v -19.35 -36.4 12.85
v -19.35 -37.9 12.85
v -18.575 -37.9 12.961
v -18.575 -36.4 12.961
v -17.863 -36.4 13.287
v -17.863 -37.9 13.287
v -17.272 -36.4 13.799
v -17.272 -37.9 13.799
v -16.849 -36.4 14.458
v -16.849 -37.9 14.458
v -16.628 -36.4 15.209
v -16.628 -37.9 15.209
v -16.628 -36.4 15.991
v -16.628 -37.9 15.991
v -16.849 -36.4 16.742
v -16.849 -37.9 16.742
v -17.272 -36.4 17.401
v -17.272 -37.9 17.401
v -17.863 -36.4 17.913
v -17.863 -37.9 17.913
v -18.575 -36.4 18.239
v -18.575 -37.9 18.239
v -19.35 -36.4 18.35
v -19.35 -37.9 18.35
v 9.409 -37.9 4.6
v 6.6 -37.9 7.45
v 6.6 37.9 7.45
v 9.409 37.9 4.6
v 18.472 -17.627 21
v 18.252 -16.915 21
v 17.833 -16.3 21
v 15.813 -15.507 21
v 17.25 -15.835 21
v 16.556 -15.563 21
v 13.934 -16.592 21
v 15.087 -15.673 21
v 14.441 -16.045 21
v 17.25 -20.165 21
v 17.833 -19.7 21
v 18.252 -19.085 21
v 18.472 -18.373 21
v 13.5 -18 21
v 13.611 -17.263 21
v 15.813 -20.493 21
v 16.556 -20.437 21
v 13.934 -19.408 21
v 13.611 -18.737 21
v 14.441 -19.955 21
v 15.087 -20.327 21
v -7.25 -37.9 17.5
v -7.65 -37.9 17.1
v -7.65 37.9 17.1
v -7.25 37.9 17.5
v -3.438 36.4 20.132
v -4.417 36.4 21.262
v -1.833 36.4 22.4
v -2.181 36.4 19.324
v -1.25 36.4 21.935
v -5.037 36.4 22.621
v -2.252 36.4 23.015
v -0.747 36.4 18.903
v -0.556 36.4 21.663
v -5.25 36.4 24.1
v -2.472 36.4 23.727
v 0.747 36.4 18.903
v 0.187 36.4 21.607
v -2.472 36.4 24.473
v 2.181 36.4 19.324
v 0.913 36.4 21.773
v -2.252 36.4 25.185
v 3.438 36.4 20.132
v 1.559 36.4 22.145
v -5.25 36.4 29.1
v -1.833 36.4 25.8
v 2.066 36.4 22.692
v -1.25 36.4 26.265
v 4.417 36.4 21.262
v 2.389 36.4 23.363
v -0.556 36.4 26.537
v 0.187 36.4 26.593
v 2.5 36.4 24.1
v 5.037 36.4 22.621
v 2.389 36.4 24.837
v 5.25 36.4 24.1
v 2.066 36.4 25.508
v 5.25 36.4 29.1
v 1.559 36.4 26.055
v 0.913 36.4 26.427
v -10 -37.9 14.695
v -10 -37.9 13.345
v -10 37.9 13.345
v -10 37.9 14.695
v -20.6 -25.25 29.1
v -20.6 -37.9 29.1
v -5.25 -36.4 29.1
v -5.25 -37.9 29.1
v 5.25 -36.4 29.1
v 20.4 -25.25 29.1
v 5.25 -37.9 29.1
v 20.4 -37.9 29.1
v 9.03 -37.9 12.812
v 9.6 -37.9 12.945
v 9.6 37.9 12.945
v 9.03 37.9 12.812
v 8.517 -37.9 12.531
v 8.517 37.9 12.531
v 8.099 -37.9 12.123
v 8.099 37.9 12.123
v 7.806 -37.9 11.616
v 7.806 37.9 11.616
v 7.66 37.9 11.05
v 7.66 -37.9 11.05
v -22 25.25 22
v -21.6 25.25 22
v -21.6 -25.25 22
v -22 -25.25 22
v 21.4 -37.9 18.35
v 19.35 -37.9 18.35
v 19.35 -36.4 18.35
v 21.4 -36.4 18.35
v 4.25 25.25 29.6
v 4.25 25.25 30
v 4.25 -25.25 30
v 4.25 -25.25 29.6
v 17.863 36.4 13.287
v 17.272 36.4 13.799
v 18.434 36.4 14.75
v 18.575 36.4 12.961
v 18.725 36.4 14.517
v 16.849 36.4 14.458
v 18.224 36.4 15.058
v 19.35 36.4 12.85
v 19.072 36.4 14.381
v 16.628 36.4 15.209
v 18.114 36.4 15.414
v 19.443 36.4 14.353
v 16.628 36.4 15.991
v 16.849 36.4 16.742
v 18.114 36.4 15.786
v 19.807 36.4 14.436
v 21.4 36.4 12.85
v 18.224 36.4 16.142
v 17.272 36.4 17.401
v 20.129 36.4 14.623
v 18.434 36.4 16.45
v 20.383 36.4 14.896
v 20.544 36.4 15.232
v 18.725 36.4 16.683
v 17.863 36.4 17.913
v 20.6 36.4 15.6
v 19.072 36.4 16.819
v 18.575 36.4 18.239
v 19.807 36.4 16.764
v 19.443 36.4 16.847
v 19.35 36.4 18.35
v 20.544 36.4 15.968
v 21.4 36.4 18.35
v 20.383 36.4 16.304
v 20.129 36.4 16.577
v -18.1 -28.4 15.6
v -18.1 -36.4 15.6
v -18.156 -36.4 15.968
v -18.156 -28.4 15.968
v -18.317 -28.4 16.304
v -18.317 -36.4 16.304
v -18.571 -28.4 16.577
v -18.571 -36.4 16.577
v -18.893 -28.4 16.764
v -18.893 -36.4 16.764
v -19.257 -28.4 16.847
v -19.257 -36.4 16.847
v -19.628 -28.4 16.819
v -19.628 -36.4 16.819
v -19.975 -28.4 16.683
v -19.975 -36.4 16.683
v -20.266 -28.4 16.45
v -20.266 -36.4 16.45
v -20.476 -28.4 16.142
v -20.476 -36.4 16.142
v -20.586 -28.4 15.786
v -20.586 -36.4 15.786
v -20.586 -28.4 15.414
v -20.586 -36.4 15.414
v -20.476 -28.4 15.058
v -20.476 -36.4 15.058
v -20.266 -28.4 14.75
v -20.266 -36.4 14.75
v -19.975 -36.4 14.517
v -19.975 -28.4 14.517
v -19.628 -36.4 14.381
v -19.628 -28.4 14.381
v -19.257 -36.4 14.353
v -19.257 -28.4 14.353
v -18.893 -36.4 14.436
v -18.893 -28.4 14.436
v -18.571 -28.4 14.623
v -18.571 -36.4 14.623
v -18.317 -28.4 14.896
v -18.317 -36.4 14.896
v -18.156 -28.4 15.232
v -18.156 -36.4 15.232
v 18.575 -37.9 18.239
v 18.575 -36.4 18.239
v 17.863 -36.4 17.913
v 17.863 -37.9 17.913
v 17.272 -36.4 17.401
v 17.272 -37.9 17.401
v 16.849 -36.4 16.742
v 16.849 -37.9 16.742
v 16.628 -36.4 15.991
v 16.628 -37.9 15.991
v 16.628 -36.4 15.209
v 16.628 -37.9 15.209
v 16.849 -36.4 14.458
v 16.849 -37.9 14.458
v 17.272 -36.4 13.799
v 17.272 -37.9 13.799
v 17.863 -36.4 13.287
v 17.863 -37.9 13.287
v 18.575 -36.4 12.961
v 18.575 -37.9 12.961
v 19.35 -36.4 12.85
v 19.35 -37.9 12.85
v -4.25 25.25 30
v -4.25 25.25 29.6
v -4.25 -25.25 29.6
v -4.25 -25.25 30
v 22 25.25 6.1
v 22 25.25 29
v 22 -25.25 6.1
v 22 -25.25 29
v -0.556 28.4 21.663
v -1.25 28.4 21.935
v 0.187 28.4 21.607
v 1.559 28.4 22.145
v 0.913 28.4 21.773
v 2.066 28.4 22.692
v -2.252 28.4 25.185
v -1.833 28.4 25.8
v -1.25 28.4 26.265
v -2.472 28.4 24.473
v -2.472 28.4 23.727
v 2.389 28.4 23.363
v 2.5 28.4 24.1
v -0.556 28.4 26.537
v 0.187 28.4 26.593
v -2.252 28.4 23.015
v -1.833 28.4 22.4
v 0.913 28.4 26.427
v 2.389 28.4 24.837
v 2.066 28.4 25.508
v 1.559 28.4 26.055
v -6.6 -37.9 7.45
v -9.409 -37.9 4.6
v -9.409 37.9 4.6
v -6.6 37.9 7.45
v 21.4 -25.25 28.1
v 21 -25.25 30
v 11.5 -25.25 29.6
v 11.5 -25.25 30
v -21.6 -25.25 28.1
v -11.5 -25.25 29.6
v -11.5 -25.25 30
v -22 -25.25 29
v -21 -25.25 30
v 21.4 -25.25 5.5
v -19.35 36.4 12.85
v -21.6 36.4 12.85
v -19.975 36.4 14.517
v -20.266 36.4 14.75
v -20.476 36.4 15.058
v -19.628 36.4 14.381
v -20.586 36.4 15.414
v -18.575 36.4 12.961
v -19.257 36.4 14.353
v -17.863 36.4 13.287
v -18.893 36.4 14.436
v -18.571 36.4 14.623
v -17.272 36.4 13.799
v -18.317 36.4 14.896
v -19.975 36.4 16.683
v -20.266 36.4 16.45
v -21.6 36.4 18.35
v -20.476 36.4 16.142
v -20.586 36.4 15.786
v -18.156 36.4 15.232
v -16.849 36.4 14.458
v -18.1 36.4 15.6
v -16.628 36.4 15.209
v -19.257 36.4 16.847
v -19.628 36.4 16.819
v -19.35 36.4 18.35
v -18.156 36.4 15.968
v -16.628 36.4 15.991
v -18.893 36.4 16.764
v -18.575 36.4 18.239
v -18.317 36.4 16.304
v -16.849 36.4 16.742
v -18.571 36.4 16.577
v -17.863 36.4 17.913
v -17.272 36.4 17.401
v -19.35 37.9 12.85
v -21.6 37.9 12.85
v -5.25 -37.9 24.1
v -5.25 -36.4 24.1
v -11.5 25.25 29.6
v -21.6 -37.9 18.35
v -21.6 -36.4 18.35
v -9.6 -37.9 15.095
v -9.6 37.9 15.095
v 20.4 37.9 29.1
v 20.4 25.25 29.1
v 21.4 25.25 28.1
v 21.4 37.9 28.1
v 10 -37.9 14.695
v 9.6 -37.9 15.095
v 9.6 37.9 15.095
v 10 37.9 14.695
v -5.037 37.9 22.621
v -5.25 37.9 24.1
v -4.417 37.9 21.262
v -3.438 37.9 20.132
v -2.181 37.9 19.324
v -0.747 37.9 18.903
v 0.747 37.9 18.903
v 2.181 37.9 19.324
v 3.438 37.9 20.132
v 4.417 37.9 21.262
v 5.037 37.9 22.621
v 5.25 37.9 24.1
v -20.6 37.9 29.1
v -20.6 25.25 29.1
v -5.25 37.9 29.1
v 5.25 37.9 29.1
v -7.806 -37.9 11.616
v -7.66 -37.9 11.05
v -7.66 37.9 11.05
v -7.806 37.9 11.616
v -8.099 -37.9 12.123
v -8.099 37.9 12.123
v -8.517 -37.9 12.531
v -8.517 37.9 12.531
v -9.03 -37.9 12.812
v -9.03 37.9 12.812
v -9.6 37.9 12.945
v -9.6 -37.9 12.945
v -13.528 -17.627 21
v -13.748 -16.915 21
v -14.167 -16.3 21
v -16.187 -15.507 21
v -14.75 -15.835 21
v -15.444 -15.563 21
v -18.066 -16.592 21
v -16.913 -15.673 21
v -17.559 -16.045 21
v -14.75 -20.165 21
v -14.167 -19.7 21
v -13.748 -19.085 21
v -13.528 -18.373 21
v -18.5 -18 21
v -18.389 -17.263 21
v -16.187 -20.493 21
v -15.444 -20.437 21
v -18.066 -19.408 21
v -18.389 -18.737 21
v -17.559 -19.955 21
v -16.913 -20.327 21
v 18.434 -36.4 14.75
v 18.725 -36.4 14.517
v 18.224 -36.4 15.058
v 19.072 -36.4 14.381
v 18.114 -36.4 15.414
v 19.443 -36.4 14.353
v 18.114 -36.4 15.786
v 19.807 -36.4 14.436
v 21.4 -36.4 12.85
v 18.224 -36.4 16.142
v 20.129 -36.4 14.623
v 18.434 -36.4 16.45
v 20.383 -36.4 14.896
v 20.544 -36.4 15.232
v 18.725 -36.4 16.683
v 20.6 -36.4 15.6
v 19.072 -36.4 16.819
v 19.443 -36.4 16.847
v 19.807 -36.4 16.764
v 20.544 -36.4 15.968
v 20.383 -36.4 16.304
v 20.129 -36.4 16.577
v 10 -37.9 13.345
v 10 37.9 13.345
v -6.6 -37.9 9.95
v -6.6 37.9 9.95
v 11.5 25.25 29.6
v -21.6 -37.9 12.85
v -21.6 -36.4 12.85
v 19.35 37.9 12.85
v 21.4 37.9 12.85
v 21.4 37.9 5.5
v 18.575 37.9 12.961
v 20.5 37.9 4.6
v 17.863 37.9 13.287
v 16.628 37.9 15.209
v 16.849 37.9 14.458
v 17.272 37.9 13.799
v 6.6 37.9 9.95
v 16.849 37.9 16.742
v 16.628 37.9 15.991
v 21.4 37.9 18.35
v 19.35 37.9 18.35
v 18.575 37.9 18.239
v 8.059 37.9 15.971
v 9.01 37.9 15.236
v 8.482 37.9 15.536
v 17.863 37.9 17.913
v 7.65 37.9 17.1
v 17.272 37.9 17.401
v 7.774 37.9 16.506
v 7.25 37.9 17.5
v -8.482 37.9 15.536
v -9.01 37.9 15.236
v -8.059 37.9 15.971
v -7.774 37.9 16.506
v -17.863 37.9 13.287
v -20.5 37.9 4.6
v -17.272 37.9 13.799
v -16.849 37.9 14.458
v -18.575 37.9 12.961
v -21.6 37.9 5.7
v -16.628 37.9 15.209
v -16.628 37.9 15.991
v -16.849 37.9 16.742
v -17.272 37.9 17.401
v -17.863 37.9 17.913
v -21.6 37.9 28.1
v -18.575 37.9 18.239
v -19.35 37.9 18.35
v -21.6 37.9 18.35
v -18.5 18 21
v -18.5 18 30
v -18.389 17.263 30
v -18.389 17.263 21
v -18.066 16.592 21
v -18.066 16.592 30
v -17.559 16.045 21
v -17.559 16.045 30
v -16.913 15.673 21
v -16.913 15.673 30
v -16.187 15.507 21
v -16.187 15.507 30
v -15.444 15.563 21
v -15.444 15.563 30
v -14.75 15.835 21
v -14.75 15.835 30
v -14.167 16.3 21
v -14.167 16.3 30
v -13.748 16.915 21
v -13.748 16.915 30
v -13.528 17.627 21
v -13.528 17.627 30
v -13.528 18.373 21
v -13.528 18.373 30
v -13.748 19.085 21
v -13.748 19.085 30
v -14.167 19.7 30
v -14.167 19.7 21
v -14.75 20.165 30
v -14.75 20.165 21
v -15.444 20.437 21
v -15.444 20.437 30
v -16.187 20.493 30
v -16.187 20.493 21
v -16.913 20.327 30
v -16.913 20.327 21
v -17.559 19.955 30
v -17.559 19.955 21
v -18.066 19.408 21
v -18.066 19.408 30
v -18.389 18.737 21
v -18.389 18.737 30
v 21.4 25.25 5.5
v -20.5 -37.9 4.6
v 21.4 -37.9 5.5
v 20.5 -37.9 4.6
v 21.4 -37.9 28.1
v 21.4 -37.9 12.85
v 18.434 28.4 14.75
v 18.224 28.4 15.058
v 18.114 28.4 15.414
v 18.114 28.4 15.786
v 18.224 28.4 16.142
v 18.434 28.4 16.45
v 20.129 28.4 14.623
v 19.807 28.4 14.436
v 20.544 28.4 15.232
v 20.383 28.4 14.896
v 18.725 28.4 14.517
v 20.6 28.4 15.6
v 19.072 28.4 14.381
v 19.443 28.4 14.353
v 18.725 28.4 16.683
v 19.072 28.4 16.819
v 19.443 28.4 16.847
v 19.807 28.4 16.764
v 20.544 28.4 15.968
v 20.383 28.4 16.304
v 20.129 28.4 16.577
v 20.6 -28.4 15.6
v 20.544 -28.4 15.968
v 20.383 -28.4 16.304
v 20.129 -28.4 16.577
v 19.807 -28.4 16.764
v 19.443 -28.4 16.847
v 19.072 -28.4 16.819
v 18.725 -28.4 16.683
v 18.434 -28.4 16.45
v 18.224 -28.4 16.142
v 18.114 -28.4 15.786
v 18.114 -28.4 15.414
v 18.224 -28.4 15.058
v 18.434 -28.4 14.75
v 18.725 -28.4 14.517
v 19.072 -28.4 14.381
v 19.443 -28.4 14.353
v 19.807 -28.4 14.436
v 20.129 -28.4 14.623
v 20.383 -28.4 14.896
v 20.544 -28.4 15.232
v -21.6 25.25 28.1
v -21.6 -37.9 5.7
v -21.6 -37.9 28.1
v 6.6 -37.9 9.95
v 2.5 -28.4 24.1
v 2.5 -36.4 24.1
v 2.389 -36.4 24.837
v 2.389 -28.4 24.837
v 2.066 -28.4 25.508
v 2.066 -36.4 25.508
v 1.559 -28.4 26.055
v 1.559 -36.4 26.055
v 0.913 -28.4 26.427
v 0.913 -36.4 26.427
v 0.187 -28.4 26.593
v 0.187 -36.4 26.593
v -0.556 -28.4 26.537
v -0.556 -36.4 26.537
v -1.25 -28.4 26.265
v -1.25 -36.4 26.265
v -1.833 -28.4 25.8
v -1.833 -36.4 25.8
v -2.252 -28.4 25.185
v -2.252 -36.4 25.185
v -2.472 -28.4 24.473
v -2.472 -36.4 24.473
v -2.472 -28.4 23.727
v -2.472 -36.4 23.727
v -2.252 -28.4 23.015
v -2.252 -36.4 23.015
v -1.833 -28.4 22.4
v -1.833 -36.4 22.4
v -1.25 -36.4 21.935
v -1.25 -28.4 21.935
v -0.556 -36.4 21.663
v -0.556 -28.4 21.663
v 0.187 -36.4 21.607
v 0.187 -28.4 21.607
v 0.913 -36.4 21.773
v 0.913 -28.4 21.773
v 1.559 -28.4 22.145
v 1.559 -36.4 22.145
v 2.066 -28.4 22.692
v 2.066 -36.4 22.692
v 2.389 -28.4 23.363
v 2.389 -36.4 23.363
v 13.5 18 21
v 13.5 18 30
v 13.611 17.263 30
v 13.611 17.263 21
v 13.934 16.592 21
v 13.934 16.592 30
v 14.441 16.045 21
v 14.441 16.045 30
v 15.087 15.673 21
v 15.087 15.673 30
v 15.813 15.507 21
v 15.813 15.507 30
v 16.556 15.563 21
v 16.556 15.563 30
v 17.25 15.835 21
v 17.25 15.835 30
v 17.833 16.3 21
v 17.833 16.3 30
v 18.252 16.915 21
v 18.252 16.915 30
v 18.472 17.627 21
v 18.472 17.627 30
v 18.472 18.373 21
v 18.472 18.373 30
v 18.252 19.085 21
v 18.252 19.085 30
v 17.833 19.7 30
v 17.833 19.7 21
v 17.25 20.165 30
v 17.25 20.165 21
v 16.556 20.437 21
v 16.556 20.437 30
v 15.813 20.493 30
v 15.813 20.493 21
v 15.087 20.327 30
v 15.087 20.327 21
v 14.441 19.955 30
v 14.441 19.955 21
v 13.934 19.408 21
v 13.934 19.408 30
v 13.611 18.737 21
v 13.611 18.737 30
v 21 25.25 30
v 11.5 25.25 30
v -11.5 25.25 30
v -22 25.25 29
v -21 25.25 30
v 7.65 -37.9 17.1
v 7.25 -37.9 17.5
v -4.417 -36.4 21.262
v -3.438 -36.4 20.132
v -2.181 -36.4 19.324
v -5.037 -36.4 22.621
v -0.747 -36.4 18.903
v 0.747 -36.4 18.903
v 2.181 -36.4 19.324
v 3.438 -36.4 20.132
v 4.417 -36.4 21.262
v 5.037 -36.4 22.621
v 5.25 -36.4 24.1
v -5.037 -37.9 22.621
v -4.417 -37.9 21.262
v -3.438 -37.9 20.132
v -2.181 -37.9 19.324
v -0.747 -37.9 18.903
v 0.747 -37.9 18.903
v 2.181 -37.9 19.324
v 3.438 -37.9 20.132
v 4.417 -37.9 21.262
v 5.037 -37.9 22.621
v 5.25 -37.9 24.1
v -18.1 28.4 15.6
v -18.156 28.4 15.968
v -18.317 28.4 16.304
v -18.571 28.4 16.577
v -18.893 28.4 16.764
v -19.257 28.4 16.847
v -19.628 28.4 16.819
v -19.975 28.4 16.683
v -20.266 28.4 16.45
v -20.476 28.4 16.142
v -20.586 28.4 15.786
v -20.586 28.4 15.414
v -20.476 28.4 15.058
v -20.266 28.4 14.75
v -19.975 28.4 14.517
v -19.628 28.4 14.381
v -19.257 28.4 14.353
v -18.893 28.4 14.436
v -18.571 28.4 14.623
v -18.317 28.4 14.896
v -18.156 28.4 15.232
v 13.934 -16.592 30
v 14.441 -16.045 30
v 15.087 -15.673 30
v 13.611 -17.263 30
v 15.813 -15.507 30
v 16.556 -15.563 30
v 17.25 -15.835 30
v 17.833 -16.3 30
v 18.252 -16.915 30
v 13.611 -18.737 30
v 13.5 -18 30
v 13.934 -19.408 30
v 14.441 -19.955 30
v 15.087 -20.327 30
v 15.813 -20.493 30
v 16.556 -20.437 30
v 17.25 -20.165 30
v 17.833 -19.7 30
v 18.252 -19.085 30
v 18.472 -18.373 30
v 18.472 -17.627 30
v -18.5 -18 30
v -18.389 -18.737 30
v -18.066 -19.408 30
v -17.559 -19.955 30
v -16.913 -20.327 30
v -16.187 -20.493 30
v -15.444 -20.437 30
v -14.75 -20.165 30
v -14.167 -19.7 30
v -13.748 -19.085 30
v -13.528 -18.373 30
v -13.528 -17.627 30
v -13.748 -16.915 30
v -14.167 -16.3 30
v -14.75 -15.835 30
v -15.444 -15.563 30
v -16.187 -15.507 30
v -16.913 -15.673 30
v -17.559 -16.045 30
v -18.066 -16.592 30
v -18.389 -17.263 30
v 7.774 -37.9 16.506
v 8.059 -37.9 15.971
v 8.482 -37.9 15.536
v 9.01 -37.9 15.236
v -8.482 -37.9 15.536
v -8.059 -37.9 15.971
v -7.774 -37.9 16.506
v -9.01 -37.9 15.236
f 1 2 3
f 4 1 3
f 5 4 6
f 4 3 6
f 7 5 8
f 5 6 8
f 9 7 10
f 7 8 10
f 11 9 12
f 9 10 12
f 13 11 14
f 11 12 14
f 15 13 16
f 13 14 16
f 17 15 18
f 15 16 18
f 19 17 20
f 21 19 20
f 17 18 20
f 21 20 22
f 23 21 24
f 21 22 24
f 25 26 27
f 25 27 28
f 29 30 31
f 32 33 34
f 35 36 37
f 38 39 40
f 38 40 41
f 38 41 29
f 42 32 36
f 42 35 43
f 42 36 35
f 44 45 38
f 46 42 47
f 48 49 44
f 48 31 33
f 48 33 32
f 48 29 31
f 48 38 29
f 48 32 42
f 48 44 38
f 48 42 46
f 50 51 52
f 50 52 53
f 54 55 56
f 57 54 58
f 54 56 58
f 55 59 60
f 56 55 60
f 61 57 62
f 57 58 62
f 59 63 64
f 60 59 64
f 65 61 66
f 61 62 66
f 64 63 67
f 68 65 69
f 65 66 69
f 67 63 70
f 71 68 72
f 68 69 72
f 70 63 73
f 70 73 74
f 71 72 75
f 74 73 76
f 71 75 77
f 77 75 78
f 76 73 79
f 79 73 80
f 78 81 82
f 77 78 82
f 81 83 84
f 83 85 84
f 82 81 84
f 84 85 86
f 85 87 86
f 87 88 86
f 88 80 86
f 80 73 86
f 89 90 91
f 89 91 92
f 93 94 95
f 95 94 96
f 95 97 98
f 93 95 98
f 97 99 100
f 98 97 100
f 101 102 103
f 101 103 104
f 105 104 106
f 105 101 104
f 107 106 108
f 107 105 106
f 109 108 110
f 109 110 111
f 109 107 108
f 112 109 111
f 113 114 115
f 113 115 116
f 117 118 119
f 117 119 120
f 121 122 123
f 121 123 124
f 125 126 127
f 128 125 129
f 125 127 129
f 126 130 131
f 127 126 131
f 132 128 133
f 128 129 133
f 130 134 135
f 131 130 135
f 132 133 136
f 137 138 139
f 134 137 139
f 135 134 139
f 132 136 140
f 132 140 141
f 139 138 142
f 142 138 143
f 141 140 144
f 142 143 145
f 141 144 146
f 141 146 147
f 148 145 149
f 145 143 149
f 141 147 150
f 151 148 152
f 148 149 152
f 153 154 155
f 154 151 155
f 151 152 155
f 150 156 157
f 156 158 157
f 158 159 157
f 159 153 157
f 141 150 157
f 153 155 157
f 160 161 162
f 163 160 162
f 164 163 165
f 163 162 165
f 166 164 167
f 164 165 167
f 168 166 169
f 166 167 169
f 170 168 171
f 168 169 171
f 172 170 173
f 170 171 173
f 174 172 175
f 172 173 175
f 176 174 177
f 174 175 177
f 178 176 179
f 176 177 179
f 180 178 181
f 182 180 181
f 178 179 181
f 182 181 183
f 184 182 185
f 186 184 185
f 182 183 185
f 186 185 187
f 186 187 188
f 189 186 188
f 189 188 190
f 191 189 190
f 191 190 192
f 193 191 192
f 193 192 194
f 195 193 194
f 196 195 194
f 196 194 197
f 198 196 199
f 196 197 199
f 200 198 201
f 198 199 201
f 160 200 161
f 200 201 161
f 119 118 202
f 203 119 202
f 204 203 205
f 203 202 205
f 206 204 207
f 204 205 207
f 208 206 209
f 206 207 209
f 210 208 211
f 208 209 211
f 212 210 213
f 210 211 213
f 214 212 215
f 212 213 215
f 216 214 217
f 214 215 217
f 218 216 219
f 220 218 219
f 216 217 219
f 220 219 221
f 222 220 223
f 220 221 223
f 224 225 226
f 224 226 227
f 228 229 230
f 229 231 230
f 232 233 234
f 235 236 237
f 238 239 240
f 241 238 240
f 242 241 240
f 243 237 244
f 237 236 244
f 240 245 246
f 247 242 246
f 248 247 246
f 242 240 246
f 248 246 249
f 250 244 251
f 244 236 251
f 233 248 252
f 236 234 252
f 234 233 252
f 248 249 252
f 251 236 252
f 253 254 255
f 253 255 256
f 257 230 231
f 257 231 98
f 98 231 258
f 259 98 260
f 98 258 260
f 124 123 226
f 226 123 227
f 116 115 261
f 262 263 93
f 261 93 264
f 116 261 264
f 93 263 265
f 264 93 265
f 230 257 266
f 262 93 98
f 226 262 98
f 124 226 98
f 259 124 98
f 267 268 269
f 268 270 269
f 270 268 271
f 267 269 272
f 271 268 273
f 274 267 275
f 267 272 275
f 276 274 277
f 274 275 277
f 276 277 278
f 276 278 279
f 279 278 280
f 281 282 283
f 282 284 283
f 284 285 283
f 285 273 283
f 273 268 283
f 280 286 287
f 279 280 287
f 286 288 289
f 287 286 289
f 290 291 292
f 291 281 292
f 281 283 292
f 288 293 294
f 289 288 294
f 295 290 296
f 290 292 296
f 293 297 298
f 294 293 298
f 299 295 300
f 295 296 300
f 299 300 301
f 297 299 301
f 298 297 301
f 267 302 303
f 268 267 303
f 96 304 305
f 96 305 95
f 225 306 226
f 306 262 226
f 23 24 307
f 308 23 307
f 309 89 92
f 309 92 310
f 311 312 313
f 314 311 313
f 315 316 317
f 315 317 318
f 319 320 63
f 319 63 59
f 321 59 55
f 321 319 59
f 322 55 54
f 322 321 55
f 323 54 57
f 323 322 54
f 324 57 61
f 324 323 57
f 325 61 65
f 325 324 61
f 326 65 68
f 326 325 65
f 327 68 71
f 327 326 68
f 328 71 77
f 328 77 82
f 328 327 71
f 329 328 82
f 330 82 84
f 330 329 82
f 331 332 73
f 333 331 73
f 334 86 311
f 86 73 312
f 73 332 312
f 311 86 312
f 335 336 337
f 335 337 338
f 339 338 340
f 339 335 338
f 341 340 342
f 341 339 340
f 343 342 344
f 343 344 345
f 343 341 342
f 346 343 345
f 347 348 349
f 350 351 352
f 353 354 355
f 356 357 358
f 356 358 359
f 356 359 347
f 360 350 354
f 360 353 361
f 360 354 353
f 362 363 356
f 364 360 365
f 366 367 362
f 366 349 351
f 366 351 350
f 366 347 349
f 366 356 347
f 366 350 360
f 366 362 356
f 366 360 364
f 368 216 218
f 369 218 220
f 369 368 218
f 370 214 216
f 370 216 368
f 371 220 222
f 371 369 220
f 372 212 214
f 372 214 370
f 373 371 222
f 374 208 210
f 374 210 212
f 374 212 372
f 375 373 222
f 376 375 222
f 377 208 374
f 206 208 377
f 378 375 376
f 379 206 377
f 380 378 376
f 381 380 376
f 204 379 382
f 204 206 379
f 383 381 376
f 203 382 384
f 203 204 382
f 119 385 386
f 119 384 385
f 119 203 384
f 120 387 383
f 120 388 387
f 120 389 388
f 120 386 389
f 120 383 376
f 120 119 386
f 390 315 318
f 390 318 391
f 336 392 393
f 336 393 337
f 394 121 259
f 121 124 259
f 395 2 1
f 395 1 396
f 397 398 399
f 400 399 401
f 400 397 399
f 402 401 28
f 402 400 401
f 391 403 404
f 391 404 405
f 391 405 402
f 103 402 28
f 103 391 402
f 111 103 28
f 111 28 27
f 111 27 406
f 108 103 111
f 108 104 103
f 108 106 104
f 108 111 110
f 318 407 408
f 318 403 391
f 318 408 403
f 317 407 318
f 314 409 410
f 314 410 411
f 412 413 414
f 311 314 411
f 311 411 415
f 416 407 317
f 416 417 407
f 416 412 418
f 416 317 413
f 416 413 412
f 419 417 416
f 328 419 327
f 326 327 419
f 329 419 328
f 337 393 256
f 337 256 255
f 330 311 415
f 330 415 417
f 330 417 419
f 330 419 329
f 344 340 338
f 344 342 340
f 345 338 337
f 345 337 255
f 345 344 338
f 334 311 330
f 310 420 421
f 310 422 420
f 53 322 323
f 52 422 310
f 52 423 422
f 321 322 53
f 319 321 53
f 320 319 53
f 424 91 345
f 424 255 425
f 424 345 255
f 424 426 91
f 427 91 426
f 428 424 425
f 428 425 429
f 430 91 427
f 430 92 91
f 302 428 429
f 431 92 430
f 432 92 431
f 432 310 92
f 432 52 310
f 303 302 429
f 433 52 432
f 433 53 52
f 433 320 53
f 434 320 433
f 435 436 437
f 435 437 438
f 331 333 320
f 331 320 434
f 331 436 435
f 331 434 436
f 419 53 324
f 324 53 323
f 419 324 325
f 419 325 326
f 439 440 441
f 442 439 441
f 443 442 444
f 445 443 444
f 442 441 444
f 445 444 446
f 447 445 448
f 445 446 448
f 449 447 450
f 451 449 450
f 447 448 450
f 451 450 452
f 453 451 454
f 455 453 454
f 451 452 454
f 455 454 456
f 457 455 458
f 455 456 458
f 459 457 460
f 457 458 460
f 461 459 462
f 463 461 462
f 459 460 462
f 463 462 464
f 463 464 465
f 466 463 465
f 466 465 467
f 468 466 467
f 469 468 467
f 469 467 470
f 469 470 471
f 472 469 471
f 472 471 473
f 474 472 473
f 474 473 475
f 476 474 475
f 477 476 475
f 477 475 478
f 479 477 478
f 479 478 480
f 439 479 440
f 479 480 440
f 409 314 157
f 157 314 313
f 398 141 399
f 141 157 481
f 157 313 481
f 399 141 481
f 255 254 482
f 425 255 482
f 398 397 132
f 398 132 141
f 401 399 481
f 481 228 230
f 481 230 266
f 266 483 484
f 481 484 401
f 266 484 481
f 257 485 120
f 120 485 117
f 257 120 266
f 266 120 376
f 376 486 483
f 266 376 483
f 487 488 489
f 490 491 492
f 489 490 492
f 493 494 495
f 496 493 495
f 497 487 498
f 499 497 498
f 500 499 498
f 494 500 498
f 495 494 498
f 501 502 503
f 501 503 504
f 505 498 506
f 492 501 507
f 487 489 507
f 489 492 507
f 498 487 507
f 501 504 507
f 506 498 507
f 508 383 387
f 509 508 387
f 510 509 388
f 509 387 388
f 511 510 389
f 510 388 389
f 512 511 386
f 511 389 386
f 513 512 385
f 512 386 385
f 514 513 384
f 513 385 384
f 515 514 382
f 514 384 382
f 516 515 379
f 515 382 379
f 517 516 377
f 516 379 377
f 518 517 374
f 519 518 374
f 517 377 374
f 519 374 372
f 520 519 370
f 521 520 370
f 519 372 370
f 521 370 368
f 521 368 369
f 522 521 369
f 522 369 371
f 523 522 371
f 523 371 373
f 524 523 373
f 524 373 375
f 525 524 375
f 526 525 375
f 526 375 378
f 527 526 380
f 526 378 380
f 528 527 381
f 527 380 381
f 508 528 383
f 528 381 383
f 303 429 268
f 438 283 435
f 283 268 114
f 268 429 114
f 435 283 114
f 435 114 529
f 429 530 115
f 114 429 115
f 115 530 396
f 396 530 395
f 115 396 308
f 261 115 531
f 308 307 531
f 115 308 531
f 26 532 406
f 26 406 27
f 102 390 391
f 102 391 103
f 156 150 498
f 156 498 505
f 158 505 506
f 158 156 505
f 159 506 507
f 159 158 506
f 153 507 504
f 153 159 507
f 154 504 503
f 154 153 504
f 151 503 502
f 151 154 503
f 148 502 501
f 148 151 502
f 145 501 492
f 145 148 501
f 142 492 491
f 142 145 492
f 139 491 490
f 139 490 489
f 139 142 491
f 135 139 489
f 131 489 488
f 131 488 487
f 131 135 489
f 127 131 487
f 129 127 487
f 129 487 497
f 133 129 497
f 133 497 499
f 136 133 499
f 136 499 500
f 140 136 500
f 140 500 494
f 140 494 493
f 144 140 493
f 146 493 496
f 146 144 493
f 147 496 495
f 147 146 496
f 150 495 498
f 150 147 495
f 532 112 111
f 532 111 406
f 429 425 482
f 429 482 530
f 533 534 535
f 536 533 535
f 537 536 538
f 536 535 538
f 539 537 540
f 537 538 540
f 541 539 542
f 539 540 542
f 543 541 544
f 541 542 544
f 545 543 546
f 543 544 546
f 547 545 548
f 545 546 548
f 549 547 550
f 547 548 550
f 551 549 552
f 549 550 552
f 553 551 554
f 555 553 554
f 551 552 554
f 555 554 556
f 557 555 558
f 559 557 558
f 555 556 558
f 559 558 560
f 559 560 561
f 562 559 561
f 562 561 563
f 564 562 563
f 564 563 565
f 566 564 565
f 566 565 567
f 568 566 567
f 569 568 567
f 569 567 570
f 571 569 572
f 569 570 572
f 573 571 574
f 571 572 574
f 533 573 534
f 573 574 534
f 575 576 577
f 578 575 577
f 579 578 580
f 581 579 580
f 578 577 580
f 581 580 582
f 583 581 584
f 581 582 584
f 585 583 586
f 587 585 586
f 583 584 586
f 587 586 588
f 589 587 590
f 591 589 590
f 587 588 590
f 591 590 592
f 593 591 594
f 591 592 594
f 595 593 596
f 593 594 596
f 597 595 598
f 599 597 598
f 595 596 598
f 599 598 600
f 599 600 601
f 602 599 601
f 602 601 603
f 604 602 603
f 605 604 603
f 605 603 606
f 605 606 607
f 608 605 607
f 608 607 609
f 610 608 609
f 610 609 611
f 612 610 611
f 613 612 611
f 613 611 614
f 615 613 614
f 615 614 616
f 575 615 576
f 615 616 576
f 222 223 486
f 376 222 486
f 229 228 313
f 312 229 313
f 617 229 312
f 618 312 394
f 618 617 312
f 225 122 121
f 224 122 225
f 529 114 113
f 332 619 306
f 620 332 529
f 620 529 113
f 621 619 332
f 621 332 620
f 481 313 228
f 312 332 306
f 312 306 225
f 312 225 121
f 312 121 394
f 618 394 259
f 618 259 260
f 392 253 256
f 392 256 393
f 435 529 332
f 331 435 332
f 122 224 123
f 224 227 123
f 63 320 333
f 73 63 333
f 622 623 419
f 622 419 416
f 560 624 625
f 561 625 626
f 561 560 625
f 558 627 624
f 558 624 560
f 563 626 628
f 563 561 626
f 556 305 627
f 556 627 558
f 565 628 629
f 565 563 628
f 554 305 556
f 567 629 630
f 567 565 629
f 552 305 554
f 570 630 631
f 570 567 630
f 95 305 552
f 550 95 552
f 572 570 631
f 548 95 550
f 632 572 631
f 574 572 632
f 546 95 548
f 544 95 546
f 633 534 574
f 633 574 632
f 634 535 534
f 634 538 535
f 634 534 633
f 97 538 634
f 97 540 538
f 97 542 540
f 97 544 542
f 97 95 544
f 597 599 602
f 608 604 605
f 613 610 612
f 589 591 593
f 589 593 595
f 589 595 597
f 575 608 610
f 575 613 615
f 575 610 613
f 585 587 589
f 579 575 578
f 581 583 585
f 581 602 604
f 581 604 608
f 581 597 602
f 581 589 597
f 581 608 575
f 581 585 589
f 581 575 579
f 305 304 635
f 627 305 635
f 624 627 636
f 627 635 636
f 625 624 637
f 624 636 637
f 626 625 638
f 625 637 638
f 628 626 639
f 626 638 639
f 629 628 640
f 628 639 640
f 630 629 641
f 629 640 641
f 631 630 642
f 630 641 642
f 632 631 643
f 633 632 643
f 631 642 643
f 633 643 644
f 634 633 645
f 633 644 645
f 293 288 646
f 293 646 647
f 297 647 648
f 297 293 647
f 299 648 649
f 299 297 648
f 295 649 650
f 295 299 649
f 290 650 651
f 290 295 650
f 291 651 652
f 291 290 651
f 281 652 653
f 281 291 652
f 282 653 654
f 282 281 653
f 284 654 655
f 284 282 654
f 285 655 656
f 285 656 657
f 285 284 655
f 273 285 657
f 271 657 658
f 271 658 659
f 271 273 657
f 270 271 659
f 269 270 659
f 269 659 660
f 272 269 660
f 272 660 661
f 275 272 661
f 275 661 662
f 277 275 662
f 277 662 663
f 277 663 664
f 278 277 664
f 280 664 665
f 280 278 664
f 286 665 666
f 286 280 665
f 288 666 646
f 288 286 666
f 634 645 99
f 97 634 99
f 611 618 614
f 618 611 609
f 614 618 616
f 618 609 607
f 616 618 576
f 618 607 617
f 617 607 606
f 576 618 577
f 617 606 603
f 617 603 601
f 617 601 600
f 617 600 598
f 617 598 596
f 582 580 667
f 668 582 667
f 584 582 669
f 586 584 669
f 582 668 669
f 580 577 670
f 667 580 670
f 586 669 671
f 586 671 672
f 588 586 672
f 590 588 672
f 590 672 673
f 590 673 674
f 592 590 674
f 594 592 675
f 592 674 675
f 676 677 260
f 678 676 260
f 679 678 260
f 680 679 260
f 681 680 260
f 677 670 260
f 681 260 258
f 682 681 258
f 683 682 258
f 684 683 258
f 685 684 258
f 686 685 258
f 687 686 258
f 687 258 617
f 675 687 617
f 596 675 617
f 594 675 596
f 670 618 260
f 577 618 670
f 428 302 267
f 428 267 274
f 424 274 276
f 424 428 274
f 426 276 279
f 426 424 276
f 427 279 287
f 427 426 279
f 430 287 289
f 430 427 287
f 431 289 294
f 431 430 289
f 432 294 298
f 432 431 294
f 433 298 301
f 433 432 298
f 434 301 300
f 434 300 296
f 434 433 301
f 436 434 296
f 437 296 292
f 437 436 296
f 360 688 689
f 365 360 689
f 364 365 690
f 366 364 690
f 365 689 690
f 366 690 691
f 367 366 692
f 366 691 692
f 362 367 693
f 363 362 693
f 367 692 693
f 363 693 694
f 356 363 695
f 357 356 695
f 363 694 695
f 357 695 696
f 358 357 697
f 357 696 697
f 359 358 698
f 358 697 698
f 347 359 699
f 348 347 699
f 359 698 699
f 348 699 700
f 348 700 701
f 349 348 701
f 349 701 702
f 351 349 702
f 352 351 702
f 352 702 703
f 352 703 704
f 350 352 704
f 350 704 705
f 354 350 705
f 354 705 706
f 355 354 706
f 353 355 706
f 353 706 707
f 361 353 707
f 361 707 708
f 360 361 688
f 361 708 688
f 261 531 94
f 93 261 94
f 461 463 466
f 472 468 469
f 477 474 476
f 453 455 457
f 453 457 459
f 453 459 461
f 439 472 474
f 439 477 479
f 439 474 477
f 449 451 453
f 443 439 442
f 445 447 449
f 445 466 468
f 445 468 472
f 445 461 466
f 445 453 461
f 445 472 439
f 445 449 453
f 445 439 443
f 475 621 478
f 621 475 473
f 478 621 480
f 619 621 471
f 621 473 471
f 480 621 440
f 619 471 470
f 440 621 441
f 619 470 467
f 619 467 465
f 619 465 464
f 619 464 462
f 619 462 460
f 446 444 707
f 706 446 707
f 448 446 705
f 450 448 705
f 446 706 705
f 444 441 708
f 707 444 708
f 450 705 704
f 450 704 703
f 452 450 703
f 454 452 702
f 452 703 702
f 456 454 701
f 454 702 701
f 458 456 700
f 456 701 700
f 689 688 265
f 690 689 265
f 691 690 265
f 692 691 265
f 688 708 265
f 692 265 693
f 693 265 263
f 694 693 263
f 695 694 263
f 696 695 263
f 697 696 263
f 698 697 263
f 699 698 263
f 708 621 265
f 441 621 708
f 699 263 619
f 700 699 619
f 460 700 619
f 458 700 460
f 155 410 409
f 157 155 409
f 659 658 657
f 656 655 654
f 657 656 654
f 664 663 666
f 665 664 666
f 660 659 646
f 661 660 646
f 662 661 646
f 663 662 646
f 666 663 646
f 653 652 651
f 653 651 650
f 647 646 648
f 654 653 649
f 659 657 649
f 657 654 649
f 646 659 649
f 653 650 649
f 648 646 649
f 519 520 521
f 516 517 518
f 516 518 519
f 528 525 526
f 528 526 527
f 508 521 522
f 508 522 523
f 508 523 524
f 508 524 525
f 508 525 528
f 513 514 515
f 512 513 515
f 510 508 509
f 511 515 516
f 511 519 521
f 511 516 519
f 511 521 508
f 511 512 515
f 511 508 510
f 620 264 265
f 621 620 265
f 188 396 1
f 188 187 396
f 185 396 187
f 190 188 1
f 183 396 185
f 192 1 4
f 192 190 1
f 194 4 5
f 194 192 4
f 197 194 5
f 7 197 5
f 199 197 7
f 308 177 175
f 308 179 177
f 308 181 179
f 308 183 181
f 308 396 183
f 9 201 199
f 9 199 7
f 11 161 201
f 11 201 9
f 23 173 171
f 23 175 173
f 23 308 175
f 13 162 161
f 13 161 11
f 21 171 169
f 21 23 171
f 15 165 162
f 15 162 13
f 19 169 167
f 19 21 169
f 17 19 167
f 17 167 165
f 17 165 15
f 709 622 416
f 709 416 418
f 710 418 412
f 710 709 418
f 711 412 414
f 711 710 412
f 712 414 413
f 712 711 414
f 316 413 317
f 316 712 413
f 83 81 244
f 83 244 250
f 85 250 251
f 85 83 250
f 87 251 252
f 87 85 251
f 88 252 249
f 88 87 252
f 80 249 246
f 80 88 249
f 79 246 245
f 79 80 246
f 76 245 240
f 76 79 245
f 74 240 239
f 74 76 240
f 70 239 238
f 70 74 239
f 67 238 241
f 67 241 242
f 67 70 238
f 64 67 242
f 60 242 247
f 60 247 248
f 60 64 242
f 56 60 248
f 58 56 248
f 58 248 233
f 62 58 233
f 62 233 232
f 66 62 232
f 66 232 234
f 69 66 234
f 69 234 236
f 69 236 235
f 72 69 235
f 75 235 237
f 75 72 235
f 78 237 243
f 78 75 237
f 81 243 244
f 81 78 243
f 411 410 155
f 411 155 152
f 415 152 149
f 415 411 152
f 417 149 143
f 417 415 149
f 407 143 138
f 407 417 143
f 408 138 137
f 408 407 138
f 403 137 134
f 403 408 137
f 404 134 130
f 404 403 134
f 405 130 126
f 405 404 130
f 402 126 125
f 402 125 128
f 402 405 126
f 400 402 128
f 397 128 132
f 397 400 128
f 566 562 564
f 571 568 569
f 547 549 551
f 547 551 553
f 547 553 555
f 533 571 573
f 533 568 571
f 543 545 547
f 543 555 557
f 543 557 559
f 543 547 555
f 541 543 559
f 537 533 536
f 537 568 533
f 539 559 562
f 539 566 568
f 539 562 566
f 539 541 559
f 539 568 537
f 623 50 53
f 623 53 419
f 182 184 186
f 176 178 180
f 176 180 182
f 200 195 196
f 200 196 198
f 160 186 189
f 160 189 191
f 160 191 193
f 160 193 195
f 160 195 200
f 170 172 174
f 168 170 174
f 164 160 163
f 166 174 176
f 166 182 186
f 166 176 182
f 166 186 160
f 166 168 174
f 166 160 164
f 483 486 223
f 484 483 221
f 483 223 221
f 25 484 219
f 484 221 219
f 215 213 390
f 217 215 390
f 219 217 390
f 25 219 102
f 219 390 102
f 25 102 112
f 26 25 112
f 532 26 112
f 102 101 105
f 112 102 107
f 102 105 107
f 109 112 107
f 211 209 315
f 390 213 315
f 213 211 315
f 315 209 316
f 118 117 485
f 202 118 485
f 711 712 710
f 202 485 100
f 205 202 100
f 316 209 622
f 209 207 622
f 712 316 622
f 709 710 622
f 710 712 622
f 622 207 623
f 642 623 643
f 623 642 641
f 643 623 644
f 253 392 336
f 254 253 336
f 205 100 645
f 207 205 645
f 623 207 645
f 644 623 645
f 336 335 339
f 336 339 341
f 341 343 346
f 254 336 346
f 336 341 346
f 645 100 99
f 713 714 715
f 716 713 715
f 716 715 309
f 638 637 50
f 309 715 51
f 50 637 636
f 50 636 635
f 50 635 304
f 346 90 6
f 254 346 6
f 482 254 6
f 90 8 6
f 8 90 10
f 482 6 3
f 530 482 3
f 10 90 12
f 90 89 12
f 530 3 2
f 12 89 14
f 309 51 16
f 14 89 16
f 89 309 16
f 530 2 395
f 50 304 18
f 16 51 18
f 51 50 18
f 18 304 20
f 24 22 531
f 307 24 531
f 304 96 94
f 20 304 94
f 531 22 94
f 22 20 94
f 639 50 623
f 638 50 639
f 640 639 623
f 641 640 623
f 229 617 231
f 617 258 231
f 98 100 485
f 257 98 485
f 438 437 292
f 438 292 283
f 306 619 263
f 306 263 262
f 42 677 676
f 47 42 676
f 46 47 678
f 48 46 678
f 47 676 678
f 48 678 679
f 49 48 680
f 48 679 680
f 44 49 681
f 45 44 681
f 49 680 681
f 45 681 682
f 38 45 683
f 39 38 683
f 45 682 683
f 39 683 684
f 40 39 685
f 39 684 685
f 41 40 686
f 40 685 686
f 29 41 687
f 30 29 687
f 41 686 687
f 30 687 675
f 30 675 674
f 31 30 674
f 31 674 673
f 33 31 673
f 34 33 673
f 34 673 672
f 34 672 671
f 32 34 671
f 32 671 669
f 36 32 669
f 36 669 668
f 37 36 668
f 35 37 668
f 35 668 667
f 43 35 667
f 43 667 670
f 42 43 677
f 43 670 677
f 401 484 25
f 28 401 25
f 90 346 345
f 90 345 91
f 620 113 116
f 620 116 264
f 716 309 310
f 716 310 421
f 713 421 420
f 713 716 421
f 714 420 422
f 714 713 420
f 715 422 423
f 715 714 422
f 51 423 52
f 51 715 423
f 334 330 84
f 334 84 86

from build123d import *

# Parameters (mm, degrees)
PAD_DEPTH            = 25.25
PAD001_DEPTH         = 37.9
POCKET_DEPTH         = 1.5
SKETCH004_R          = 1.25
SKETCH004_R_2        = 2.5
POCKET001_DEPTH      = 8
POCKET002_DEPTH      = 37.901
POCKET002_DEPTH_BACK = 37.901
SKETCH001_R          = 2.5
POCKET003_DEPTH      = 9


with BuildPart() as part:
    # Sketch → Pad (new body, symmetric)
    with BuildSketch(Plane.XZ):
        Polygon((-21, 30), (-11.5, 30), (-11.5, 29.6), (-4.25, 29.6), (-4.25, 30), (4.25, 30), (4.25, 29.6), (11.5, 29.6), (11.5, 30), (21, 30), (22, 29), (22, 6.1), (20.5, 4.6), (-20.5, 4.6), (-21.6, 5.7), (-21.6, 22), (-22, 22), (-22, 29), align=None)
    extrude(amount=PAD_DEPTH, both=True)

    # Sketch002 → Pad001 (join, symmetric)
    with BuildSketch(Plane.XZ):
        Polygon((-20.6, 29.1), (20.4, 29.1), (21.4, 28.1), (21.4, 5.5), (20.5, 4.6), (-20.5, 4.6), (-21.6, 5.7), (-21.6, 28.1), align=None)
    extrude(amount=PAD001_DEPTH, both=True)

    # Sketch003 (on Face7 of Pad001) → Pocket (cut)
    with BuildSketch(Plane.XZ.offset(37.9)):
        with BuildLine():
            ThreePointArc((-5.25, 24.1), (0, 18.85), (5.25, 24.1))
            Line((5.25, 24.1), (5.25, 29.1))
            Line((-5.25, 29.1), (5.25, 29.1))
            Line((-5.25, 24.1), (-5.25, 29.1))
        make_face()
        with BuildLine():
            ThreePointArc((-19.35, 12.85), (-16.6, 15.6), (-19.35, 18.35))
            Line((-19.35, 18.35), (-21.6, 18.35))
            Line((-21.6, 18.35), (-21.6, 12.85))
            Line((-19.35, 12.85), (-21.6, 12.85))
        make_face()
        with BuildLine():
            ThreePointArc((19.35, 18.35), (16.6, 15.6), (19.35, 12.85))
            Line((19.35, 12.85), (21.4, 12.85))
            Line((21.4, 18.35), (21.4, 12.85))
            Line((19.35, 18.35), (21.4, 18.35))
        make_face()
    pocket = extrude(amount=-POCKET_DEPTH, mode=Mode.SUBTRACT)

    # Sketch004 (on Face42 of Pocket) → Pocket001 (cut)
    with BuildSketch(Plane.XZ.offset(36.4)):
        with Locations((-19.35, 15.6)):
            Circle(SKETCH004_R)
        with Locations((19.35, 15.6)):
            Circle(SKETCH004_R)
        with Locations((0, 24.1)):
            Circle(SKETCH004_R_2)
    pocket001 = extrude(amount=-POCKET001_DEPTH, mode=Mode.SUBTRACT)

    # Mirrored: Pocket001, Pocket across XZ
    add(pocket001.mirror(Plane.XZ), mode=Mode.SUBTRACT)
    add(pocket.mirror(Plane.XZ), mode=Mode.SUBTRACT)

    # Sketch010 → Pocket002 (cut, two sides)
    with BuildSketch(Plane.XZ) as pocket002_sk:
        with BuildLine():
            Line((-9, 0), (-10, 1))
            Line((-10, 1), (-10, 4))
            Line((-10, 4), (-6.6, 7.45))
            Line((-6.6, 7.45), (-6.6, 9.95))
            Line((-6.6, 9.95), (-7.659962205, 11.05))
            ThreePointArc((-7.659962205, 11.05), (-8.2943527546, 12.3411969817), (-9.6, 12.9452882706))
            Line((-9.6, 12.9452882706), (-10, 13.3452882706))
            Line((-10, 13.3452882706), (-10, 14.6952882706))
            Line((-10, 14.6952882706), (-9.6, 15.0952882706))
            ThreePointArc((-9.6, 15.0952882706), (-8.2555446657, 15.738271817), (-7.65, 17.1))
            Line((-7.65, 17.1), (-7.25, 17.5))
            Line((-7.25, 17.5), (0, 17.5))
            Line((0, 17.5), (7.25, 17.5))
            Line((7.25, 17.5), (7.65, 17.1))
            ThreePointArc((7.65, 17.1), (8.2555446657, 15.738271817), (9.6, 15.0952882706))
            Line((9.6, 15.0952882706), (10, 14.6952882706))
            Line((10, 14.6952882706), (10, 13.3452882706))
            Line((10, 13.3452882706), (9.6, 12.9452882706))
            ThreePointArc((9.6, 12.9452882706), (8.2943527546, 12.3411969817), (7.659962205, 11.05))
            Line((7.659962205, 11.05), (6.6, 9.95))
            Line((6.6, 9.95), (6.6, 7.45))
            Line((6.6, 7.45), (10, 4))
            Line((10, 4), (10, 1))
            Line((10, 1), (9, 0))
            Line((4, 0), (9, 0))
            Line((4, 0.4), (4, 0))
            Line((-4, 0.4), (4, 0.4))
            Line((-4, 0), (-4, 0.4))
            Line((-9, 0), (-4, 0))
        make_face()
    extrude(amount=-POCKET002_DEPTH, mode=Mode.SUBTRACT)
    extrude(pocket002_sk.sketch, amount=POCKET002_DEPTH_BACK, mode=Mode.SUBTRACT)

    # Sketch001 (on Face11 of Pad) → Pocket003 (cut)
    with BuildSketch(Plane(origin=(0, 0, 30), x_dir=(-1, 0, 0), z_dir=(0, 0, 1))):
        with Locations((-16, 18)):
            Circle(SKETCH001_R)
        with Locations((-16, -18)):
            Circle(SKETCH001_R)
        with Locations((16, 18)):
            Circle(SKETCH001_R)
        with Locations((16, -18)):
            Circle(SKETCH001_R)
    extrude(amount=-POCKET003_DEPTH, mode=Mode.SUBTRACT)


solid = part.part
